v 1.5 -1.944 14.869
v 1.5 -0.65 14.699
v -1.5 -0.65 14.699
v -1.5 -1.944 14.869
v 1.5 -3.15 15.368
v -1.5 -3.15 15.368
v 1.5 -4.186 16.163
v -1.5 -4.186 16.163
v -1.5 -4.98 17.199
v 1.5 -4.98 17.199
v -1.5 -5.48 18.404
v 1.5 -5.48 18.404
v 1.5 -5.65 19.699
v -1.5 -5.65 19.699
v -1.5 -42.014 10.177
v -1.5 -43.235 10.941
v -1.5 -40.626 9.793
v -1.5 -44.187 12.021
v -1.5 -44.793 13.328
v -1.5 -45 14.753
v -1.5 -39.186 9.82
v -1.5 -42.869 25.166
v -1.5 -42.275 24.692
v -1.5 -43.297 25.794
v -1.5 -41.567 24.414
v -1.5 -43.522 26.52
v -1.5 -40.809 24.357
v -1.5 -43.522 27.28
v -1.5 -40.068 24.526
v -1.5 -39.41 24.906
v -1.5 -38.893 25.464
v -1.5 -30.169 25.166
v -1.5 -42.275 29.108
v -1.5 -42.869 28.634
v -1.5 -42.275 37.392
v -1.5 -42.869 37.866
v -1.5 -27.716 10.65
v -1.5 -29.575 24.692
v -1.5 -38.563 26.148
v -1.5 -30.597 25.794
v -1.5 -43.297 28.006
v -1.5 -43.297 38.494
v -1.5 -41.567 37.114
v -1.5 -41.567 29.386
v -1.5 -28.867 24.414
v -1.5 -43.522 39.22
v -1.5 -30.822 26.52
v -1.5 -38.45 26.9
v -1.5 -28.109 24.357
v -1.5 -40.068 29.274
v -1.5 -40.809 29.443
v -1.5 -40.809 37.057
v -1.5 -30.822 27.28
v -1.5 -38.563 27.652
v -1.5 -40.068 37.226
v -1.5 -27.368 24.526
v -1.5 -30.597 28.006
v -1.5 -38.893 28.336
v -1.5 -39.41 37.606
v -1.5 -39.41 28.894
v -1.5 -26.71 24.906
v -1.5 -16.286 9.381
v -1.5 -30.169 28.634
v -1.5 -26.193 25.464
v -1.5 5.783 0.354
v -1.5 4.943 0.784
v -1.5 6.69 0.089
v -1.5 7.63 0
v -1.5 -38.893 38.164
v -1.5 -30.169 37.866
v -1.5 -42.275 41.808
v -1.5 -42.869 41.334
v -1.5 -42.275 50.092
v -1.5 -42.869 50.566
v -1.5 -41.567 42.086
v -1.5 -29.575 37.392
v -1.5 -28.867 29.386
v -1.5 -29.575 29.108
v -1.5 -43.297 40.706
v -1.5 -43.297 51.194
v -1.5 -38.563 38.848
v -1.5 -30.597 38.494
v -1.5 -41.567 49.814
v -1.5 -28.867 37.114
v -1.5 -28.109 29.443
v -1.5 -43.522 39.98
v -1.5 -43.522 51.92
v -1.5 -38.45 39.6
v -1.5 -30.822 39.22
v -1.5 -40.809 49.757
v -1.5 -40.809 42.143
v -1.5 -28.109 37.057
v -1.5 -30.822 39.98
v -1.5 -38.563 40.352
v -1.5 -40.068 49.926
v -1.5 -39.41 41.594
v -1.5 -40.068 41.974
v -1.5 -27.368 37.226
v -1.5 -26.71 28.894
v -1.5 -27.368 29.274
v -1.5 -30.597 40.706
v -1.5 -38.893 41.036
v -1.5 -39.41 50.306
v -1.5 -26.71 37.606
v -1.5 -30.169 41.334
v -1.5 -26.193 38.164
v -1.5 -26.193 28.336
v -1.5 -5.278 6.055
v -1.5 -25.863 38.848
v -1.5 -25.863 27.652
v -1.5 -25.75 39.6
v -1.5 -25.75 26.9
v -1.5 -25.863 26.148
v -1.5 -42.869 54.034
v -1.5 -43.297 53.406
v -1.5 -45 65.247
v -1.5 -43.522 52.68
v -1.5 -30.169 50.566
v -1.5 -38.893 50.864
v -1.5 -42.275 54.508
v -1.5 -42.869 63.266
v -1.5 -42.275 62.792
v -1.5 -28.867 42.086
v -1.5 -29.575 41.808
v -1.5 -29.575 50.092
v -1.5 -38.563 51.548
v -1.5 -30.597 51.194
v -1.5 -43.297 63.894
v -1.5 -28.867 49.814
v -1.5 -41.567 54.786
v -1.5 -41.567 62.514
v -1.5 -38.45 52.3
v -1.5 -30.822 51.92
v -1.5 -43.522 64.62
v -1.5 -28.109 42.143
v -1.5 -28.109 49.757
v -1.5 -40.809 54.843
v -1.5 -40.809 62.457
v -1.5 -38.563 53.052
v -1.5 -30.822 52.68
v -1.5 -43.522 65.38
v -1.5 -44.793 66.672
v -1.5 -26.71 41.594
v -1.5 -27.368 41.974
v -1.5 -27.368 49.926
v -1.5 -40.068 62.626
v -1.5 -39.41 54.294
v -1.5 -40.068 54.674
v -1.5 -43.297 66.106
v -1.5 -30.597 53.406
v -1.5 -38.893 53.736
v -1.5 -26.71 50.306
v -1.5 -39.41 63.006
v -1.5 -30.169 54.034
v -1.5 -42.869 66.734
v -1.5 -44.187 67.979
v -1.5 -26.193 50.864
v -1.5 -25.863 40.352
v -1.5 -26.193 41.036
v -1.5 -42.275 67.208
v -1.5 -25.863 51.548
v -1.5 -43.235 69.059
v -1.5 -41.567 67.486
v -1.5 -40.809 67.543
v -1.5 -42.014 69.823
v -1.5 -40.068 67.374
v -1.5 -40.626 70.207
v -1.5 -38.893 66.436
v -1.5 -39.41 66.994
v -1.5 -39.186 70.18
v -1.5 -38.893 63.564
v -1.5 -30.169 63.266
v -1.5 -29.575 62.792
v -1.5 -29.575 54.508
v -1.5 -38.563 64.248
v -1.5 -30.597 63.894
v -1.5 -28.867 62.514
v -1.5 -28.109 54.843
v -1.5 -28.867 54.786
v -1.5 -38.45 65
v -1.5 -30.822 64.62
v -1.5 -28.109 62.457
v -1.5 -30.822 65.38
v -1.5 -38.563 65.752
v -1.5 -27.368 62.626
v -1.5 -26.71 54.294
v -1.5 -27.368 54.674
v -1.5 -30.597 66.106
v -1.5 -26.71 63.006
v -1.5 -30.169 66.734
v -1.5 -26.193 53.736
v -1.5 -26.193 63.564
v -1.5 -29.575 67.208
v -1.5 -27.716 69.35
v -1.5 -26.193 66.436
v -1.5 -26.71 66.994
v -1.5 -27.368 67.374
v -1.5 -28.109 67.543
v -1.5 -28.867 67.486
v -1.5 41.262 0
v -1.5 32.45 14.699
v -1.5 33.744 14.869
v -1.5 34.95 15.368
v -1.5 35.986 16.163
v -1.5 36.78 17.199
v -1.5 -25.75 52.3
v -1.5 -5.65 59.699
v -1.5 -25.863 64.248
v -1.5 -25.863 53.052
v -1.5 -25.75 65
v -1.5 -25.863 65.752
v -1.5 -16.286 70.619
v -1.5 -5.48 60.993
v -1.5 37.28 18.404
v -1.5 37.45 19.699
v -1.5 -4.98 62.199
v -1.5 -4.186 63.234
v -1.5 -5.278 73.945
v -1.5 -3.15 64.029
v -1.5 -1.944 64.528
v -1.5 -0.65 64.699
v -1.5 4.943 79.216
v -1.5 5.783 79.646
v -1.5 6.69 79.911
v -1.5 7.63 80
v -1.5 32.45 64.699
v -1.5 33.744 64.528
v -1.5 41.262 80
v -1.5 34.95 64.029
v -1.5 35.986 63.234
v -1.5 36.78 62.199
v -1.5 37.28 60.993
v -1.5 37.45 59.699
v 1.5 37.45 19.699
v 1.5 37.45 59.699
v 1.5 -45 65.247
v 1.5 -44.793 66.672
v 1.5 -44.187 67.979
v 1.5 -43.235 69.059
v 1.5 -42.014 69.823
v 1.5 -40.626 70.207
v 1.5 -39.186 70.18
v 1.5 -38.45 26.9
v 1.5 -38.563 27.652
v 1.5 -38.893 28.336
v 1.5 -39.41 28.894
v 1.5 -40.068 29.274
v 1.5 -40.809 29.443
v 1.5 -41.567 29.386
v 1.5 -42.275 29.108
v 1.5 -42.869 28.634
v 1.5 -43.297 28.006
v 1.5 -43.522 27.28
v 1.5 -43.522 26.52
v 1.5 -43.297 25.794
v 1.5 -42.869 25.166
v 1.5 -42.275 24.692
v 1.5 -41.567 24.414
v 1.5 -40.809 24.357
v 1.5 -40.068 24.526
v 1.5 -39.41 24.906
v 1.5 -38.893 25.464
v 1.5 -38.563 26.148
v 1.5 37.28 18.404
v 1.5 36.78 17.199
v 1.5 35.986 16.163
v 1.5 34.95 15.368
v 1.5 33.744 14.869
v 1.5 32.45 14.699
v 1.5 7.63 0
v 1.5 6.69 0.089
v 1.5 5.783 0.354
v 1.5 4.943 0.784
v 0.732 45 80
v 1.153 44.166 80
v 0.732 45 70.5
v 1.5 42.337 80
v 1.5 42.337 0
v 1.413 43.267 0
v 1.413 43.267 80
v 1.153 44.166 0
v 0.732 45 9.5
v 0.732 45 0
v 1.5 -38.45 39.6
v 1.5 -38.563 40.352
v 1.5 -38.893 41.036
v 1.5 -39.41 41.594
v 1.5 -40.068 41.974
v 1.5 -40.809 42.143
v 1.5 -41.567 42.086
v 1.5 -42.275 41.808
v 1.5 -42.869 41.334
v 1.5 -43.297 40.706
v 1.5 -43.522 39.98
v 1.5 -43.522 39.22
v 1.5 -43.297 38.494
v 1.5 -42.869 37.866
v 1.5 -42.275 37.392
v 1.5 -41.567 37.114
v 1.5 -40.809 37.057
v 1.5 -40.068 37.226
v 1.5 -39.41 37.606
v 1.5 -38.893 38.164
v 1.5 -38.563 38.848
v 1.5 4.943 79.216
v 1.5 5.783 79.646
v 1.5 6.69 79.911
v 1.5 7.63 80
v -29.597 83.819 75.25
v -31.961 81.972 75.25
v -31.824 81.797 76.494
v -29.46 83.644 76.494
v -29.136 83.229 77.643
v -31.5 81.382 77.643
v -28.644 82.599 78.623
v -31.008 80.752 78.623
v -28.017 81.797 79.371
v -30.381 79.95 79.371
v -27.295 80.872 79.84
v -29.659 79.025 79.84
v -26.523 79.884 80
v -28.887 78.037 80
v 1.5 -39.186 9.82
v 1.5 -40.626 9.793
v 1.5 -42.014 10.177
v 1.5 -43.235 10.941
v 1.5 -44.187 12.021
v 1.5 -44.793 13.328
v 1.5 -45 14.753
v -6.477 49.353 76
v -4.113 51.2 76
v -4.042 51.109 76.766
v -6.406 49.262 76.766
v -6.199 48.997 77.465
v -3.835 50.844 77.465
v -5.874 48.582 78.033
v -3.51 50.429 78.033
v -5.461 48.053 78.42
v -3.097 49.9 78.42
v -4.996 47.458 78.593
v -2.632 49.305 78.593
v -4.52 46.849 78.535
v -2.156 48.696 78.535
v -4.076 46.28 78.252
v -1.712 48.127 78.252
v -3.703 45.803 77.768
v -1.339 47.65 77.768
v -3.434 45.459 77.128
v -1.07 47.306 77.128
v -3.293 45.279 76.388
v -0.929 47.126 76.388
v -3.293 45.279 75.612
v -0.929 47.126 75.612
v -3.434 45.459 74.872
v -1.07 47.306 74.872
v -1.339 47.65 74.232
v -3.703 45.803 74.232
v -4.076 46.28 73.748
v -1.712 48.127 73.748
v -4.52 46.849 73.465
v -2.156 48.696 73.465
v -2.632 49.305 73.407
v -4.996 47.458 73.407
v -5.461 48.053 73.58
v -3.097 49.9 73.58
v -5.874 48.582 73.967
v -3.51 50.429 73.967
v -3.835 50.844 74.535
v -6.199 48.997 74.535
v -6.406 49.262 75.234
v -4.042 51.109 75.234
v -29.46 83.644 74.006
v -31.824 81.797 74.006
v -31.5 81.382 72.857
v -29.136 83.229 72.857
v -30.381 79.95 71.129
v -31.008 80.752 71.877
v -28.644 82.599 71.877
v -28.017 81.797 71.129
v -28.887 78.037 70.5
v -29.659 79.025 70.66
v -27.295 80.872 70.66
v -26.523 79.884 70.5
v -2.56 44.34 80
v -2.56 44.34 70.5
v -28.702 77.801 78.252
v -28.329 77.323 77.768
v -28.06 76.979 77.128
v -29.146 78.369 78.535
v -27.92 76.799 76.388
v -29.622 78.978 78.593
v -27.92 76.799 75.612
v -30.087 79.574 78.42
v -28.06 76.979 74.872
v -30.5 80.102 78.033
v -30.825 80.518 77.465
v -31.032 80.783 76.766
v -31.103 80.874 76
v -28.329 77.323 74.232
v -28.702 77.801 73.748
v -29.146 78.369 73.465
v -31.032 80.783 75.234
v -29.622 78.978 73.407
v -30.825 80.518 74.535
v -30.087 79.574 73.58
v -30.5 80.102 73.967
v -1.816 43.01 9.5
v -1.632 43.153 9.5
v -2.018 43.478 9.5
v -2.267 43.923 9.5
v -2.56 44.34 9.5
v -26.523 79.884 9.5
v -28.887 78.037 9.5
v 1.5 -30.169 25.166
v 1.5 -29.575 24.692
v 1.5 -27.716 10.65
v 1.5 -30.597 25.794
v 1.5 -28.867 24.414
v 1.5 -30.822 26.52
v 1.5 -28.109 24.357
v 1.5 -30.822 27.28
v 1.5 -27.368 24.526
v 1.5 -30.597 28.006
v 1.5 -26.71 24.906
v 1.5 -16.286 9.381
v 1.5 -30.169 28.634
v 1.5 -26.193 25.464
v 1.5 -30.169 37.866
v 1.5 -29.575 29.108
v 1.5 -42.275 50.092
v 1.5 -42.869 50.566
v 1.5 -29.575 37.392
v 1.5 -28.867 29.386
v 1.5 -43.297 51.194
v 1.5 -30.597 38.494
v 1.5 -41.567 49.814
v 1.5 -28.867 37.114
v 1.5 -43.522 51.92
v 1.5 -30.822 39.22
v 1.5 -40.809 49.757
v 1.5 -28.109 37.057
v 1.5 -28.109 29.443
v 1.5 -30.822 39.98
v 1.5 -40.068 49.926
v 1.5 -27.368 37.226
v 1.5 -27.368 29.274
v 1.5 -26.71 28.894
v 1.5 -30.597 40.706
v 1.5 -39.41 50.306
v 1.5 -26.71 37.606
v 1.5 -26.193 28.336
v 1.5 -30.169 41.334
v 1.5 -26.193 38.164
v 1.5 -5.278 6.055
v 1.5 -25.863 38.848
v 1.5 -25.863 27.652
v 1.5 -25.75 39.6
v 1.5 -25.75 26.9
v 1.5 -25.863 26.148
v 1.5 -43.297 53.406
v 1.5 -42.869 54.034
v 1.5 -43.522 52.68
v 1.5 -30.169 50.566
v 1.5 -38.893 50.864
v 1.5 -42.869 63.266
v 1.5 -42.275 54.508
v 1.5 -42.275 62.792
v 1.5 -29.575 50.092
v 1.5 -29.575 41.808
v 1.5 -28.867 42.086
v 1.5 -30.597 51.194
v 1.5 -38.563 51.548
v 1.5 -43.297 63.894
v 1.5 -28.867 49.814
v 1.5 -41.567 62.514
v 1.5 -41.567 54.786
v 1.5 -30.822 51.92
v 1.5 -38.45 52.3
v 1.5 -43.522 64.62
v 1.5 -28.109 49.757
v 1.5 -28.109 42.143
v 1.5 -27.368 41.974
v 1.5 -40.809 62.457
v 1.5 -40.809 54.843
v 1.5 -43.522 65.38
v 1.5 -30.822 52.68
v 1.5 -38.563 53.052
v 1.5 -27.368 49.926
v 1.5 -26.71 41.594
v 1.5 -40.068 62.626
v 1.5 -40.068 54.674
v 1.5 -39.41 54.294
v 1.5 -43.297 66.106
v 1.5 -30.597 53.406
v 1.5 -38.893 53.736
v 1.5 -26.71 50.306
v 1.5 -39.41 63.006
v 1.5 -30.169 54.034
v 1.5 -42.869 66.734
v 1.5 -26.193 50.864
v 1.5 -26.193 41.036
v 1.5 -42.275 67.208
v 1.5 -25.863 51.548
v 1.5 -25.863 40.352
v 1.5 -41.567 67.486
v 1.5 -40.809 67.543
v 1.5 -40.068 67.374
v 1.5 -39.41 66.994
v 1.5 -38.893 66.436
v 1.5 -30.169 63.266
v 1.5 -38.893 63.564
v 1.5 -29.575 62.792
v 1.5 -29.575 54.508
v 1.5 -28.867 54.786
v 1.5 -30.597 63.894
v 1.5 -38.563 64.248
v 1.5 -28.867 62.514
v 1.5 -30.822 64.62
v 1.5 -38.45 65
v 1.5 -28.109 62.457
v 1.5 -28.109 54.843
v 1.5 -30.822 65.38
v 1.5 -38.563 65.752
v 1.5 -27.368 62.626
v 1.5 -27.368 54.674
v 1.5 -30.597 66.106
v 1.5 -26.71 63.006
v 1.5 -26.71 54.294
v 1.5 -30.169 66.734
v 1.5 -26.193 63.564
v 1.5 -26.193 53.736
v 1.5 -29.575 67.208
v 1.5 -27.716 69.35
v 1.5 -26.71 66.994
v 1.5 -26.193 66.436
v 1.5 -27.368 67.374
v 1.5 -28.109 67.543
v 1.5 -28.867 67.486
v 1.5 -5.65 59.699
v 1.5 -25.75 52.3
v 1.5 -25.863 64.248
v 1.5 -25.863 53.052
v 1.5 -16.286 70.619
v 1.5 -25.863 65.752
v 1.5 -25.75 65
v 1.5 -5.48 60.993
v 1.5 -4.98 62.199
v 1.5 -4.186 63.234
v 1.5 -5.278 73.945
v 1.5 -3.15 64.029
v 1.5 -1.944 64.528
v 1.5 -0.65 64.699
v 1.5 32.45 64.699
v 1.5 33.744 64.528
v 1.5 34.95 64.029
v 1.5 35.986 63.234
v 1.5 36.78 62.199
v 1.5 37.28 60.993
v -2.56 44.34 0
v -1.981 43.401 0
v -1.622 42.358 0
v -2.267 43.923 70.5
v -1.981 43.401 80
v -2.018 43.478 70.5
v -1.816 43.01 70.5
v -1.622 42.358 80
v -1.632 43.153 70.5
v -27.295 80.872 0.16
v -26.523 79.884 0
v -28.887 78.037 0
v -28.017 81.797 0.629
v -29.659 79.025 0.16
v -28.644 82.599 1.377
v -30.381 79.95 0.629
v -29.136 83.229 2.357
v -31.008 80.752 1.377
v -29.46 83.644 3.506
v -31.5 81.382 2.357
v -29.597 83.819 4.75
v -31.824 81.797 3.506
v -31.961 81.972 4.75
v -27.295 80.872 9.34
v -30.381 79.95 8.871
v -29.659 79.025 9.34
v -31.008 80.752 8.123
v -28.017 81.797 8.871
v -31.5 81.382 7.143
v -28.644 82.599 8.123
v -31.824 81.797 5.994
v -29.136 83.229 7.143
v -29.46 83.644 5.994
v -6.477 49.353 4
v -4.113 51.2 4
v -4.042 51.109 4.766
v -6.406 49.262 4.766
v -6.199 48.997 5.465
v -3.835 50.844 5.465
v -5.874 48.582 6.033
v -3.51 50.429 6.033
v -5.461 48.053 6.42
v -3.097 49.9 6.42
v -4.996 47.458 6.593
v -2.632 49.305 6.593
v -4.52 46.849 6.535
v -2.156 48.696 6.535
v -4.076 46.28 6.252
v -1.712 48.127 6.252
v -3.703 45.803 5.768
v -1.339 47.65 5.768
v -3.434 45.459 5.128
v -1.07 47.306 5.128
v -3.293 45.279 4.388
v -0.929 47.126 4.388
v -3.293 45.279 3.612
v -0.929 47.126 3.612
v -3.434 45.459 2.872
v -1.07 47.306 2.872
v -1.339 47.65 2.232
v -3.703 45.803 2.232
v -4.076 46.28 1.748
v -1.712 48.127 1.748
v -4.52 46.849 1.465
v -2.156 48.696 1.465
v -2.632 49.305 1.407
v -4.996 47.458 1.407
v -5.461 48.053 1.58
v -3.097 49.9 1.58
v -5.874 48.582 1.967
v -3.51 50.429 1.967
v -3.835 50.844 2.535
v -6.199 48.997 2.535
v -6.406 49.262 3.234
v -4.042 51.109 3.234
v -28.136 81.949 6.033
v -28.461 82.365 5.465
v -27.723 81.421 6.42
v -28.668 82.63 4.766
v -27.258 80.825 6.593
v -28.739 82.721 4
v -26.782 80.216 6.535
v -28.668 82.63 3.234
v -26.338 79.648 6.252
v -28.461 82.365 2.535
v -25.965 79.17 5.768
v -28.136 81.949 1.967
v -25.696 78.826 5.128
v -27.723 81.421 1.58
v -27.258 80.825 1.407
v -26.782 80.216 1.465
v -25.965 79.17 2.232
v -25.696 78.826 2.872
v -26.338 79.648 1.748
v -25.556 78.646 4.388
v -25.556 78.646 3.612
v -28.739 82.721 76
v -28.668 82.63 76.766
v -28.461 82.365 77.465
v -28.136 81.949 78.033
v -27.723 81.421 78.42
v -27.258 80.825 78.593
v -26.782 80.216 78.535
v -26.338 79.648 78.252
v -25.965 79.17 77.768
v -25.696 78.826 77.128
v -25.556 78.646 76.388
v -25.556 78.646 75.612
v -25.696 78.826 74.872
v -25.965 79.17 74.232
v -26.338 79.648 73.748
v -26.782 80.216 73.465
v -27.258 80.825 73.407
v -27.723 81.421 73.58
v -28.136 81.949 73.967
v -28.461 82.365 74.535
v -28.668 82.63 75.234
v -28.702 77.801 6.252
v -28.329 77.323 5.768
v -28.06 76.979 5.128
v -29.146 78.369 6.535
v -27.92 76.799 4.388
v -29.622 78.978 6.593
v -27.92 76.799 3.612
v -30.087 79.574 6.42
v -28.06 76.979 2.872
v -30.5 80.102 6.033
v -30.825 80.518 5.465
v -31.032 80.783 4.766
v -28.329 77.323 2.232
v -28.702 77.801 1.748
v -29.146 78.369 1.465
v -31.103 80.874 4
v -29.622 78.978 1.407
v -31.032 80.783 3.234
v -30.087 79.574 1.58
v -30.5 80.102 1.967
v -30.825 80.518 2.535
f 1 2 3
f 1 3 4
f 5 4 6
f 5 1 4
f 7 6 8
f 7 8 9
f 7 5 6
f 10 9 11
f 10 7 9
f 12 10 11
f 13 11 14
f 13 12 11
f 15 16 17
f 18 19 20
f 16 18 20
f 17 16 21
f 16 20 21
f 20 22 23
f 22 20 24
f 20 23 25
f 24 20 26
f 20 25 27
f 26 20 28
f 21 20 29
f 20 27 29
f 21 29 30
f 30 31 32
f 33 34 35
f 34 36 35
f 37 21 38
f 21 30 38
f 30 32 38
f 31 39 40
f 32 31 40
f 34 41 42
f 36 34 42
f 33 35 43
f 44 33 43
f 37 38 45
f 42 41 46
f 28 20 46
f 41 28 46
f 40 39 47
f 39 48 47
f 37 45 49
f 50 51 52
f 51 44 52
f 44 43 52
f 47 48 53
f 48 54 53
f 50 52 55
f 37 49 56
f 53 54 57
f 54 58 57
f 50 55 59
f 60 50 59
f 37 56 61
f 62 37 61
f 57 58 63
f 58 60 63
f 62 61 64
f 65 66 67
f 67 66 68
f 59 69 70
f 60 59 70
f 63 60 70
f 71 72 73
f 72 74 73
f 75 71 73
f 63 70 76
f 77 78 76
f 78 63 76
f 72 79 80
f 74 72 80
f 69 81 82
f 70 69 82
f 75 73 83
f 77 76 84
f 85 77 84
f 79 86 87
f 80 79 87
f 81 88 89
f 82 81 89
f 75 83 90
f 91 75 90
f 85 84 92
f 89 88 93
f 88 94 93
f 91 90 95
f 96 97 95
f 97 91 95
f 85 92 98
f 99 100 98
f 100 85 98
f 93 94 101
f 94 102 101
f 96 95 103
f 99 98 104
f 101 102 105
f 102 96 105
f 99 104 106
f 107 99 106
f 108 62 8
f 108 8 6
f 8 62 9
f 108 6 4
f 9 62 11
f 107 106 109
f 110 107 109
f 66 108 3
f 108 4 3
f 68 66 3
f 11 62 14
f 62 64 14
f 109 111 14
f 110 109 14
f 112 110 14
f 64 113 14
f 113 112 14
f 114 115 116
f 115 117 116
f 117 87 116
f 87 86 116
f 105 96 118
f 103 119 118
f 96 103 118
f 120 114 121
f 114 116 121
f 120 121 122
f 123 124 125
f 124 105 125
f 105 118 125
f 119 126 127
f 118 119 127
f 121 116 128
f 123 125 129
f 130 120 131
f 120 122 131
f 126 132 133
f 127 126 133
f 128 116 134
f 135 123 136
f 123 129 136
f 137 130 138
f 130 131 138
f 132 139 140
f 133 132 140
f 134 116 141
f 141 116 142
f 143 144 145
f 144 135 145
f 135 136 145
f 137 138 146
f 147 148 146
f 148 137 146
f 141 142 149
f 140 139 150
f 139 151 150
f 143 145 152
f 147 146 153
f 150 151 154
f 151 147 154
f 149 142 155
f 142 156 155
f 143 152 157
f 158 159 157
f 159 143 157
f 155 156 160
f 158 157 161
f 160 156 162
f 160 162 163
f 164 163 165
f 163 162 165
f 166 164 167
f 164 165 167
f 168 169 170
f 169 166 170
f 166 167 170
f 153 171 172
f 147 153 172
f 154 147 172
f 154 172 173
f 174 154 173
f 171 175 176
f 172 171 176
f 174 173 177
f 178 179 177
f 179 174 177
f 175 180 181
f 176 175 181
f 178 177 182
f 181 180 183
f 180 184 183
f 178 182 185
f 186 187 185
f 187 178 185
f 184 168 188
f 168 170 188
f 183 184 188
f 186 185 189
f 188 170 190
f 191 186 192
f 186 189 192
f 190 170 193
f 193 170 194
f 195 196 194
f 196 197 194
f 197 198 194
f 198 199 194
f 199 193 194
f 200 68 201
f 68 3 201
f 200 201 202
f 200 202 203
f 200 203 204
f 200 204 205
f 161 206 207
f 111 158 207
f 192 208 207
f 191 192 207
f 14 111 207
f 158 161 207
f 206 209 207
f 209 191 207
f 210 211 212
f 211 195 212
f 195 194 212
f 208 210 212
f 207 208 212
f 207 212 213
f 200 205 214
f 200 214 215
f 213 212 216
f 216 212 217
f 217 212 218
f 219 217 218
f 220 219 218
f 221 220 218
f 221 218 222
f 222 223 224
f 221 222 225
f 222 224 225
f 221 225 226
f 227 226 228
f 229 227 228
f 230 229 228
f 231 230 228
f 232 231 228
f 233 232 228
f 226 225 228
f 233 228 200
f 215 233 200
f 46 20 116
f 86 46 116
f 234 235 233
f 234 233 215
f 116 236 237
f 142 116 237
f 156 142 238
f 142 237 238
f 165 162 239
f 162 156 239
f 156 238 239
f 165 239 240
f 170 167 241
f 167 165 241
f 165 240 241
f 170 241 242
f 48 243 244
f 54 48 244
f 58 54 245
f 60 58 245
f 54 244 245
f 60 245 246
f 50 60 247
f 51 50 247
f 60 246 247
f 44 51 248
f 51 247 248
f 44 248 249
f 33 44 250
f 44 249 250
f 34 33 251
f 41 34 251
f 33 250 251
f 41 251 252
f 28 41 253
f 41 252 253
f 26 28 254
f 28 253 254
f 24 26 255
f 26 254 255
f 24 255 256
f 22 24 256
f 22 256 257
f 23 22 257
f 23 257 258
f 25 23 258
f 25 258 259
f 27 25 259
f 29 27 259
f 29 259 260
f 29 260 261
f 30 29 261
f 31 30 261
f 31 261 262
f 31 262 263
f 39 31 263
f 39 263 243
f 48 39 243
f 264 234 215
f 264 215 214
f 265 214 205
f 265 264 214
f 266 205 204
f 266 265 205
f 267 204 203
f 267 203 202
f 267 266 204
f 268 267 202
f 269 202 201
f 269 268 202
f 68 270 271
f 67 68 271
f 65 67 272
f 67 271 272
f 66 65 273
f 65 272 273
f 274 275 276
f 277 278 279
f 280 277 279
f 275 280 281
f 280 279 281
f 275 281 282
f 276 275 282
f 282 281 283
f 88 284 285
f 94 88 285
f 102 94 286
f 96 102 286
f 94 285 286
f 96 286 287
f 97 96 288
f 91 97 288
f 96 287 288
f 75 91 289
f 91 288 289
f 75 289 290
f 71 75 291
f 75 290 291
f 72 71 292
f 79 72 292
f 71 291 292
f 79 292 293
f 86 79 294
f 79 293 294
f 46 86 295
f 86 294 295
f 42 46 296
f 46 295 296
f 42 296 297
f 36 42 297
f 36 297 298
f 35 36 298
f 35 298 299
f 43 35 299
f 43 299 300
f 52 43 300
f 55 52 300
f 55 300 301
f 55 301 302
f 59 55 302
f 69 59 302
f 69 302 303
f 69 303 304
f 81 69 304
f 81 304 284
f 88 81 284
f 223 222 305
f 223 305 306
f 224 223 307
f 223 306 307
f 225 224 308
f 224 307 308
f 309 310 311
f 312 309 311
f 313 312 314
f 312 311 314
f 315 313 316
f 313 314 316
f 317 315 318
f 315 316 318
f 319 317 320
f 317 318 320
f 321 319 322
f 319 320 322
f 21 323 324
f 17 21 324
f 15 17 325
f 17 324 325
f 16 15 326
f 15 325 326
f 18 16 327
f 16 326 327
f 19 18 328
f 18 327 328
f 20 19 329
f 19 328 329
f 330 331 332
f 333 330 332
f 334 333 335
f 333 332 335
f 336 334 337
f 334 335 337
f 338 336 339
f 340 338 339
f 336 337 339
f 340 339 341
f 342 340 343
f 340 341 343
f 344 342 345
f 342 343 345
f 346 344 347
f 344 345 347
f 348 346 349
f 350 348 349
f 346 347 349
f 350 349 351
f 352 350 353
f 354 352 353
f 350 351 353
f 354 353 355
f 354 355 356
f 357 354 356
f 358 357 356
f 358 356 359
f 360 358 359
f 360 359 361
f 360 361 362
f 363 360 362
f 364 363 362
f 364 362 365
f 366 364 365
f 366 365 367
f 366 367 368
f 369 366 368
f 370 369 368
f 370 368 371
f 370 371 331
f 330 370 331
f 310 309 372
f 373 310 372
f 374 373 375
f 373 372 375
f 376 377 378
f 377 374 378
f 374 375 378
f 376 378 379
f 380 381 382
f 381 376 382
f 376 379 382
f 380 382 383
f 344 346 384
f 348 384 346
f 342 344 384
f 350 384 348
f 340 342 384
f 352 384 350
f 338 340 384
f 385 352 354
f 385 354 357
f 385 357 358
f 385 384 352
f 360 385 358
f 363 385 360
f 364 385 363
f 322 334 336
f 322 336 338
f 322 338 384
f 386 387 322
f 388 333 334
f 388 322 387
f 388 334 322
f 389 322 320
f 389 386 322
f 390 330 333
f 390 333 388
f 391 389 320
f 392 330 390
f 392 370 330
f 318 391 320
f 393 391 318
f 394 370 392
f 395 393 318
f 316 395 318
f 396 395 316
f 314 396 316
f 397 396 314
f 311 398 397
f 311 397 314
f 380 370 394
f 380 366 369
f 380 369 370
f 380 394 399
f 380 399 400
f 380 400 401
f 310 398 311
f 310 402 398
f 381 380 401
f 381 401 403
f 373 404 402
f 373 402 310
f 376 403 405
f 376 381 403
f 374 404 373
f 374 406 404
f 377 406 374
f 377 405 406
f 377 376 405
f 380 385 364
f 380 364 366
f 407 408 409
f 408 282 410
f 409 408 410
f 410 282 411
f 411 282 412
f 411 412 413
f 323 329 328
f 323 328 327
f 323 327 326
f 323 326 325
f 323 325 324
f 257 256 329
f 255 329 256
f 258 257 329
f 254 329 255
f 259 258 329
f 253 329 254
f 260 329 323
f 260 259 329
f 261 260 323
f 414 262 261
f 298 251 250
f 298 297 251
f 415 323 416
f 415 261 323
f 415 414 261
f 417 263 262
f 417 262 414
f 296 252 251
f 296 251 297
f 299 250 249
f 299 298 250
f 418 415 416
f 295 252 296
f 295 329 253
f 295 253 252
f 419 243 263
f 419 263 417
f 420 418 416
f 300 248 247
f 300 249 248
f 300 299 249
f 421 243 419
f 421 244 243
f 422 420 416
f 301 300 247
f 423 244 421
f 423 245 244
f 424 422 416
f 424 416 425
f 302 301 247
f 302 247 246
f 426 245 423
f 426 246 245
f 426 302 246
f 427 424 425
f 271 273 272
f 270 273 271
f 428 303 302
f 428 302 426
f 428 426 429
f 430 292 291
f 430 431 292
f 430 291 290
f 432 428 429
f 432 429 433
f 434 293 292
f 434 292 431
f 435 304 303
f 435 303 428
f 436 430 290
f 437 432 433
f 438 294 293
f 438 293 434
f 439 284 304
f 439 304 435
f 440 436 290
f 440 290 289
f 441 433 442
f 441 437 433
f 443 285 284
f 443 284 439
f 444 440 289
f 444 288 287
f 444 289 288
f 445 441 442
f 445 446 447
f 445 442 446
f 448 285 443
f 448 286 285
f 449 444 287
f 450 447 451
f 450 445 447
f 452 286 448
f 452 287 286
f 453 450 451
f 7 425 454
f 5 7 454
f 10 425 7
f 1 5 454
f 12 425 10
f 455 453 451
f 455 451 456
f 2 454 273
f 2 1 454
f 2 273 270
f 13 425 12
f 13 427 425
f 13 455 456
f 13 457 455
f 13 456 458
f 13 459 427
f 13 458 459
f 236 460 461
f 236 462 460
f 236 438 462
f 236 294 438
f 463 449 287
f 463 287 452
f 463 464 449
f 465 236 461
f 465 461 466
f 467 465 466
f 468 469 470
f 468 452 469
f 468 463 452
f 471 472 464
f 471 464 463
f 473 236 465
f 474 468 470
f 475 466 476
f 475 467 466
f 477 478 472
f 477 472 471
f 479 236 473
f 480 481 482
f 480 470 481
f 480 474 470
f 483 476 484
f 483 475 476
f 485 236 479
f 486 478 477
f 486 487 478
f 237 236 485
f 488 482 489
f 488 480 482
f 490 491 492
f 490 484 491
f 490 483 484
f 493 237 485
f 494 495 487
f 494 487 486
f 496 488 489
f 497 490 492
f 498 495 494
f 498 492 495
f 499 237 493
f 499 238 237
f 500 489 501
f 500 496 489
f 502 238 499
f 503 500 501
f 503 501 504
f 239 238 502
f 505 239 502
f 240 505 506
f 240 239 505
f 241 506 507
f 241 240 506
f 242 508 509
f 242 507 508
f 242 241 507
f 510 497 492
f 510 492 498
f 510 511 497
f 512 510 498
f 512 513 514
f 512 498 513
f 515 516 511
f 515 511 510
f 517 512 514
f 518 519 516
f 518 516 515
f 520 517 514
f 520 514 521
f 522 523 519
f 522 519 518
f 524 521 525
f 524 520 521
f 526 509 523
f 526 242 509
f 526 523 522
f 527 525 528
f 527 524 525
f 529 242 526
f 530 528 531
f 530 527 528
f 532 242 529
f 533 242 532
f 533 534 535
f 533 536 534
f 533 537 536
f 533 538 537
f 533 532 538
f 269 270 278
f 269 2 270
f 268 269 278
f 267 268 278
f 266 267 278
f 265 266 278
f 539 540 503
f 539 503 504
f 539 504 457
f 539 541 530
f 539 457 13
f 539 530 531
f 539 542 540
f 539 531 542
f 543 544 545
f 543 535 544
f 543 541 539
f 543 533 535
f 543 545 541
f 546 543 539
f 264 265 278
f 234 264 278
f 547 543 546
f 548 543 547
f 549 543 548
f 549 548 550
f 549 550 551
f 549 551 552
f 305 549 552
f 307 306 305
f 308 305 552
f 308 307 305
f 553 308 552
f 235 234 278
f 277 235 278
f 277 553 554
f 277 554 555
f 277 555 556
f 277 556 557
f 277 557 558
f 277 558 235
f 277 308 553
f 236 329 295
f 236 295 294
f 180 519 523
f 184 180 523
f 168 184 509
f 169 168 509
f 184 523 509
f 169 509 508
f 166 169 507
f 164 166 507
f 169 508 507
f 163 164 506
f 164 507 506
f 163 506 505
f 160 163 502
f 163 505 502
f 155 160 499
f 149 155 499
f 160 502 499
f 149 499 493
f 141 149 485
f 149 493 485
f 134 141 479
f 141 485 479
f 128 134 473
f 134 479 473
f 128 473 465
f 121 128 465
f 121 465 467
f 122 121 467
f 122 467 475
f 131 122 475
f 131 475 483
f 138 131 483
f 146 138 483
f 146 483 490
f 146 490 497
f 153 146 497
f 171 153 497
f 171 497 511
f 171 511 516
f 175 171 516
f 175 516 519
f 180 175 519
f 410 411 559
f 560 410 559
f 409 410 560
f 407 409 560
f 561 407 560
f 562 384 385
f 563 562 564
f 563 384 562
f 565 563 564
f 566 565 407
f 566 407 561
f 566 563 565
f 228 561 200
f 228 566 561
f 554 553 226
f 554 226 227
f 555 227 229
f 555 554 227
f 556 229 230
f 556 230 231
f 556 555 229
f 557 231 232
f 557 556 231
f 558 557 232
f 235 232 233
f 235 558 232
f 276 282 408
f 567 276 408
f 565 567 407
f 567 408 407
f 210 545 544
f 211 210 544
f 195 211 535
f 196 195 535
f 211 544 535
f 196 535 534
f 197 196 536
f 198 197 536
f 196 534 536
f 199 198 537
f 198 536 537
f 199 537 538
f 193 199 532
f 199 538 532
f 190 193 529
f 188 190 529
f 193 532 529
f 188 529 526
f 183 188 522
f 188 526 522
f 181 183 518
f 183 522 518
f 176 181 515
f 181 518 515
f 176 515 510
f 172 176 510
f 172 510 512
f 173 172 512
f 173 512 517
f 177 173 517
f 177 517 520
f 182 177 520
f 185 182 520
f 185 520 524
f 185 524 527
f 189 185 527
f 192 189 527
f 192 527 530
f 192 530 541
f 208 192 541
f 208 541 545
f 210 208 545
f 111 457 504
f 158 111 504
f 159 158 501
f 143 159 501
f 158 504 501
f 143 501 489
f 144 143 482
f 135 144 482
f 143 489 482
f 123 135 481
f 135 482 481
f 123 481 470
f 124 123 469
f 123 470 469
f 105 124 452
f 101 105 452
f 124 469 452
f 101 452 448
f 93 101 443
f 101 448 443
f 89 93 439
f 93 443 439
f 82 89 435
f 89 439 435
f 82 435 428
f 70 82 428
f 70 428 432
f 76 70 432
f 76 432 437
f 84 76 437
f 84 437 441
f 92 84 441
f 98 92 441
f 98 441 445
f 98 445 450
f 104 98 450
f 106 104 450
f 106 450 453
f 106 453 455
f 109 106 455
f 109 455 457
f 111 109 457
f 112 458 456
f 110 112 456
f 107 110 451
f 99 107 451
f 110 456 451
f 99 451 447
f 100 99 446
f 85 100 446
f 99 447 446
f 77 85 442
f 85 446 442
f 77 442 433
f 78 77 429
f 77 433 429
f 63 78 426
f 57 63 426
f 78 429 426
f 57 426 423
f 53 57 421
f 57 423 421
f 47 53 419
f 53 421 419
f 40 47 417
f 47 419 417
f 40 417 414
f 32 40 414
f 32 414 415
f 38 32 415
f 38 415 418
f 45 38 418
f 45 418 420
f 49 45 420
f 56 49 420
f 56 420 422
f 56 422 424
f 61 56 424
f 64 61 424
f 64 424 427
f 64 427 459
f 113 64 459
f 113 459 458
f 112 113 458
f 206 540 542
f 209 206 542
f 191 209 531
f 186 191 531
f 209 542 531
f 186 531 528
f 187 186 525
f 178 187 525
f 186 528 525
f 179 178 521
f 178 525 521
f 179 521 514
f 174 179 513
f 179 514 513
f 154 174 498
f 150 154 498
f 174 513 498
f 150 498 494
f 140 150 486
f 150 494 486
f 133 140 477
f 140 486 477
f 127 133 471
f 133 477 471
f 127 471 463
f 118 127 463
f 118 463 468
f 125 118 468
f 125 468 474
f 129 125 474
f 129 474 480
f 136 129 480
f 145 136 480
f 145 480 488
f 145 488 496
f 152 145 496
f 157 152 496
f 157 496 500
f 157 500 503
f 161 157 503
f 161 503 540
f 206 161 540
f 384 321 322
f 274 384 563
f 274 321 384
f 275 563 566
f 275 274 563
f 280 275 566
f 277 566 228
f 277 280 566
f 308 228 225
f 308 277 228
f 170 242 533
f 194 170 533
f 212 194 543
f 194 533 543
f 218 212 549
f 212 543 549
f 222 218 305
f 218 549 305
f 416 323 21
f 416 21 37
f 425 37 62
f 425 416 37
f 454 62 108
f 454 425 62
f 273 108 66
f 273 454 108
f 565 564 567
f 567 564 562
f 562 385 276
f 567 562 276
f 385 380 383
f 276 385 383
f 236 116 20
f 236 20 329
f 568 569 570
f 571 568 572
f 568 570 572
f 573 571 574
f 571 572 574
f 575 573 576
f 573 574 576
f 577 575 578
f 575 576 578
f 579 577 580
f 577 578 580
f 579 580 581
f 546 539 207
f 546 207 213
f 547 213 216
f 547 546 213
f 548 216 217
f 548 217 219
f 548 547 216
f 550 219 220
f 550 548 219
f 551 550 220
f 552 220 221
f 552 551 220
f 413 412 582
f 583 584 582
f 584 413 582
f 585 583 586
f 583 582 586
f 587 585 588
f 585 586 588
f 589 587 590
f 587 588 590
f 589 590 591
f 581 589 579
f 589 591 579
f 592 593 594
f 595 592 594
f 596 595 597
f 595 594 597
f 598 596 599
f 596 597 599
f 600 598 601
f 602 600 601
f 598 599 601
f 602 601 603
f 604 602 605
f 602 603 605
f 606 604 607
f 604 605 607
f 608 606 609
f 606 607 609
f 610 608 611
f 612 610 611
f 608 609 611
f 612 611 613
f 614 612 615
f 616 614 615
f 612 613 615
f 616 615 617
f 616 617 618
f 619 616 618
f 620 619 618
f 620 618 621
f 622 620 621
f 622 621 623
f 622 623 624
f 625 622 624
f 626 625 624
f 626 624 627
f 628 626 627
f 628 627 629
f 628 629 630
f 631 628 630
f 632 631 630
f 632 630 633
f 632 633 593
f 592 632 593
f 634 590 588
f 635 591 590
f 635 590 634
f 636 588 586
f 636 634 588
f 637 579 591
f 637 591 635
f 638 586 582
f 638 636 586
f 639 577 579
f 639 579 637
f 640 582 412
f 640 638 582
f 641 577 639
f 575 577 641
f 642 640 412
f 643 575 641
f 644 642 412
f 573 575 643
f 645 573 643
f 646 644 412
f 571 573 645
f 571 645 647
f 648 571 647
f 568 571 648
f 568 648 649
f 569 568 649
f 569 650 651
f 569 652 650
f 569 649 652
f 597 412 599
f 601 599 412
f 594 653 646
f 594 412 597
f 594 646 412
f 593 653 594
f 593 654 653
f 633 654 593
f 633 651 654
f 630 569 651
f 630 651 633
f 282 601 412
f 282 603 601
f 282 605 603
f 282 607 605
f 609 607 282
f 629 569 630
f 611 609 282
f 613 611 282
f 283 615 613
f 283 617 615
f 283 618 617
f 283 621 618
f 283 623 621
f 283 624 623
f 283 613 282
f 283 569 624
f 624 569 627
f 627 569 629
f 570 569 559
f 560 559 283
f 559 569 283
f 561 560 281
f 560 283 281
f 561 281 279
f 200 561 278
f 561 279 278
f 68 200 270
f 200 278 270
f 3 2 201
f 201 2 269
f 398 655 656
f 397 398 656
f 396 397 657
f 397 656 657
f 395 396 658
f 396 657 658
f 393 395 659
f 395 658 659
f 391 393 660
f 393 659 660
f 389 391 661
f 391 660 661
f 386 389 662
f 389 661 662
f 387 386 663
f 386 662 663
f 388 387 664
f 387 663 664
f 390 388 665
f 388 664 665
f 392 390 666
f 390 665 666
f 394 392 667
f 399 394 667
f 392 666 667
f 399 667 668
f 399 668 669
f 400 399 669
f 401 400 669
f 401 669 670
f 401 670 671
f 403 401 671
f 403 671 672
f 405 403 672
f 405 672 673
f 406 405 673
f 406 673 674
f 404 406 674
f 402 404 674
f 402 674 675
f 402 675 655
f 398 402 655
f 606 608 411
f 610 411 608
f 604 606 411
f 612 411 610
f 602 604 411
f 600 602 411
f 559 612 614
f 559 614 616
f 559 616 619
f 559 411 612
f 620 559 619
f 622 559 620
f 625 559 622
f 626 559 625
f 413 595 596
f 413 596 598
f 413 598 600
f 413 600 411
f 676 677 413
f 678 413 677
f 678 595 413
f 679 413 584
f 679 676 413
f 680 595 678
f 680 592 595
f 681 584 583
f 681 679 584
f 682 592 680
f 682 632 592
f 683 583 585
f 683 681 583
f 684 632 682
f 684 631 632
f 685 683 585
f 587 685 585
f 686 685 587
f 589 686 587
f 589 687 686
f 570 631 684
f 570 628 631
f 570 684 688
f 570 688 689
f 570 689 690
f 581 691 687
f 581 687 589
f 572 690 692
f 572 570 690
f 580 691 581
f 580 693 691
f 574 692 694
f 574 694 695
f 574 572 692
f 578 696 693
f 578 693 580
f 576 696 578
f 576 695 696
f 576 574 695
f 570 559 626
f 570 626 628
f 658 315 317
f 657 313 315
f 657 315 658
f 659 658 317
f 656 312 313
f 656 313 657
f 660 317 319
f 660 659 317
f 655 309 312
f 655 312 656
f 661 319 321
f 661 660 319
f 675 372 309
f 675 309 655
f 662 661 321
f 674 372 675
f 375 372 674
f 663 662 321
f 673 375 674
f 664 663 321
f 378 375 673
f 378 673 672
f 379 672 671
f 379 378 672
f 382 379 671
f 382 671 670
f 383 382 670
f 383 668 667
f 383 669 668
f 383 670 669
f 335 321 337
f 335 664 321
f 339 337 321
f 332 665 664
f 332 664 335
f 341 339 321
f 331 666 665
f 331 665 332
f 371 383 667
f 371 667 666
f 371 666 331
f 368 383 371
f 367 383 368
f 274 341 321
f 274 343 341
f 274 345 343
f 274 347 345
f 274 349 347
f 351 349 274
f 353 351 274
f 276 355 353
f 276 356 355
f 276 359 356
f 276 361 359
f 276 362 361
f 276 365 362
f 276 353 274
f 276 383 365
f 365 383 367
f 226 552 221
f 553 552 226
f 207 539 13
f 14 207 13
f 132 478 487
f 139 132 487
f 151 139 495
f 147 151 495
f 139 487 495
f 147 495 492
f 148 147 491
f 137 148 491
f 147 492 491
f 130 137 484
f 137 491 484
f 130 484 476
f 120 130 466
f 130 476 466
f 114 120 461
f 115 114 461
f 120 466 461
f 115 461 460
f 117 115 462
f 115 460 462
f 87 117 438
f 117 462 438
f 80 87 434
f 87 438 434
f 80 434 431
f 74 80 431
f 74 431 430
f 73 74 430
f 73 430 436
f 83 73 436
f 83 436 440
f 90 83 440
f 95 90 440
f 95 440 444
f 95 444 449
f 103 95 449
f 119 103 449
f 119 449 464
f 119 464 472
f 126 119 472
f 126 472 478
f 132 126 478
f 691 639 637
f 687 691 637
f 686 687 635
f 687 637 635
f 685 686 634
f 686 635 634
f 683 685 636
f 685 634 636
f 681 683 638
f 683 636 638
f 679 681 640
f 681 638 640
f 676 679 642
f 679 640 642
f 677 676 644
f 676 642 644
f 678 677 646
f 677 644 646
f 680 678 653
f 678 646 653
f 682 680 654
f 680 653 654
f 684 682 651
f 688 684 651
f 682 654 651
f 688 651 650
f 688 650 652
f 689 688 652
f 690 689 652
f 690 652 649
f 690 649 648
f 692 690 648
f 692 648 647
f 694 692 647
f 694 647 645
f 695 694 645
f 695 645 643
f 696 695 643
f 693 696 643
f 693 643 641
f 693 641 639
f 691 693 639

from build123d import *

# Parameters (mm, degrees)
SKETCH_1_W          = 3
SKETCH_1_H          = 90
EXTRUDE_1_DEPTH     = 80
SKETCH_2_R          = 2.6
CUT_EXTRUDE_1_DEPTH = 118.276484819
SKETCH_3_W          = 49.268401117
SKETCH_3_H          = 61
CUT_EXTRUDE_2_DEPTH = 118.276484819
SKETCH_4_R          = 2.55
CUT_EXTRUDE_3_DEPTH = 121.608375453
CUT_EXTRUDE_4_DEPTH = 121.608375453
FILLET_2_R          = 5
SKETCH_6_W          = 50
SKETCH_6_H          = 43.1
CUT_EXTRUDE_6_DEPTH = 121.608375453
FILLET_3_R          = 5


with BuildPart() as part:
    # 草图1 → 凸台-拉伸1 (new body)
    with BuildSketch(Plane.XY):
        Polygon((-1.18201613, 42.576507787), (-31.965089897, 81.977045467), (-29.601057636, 83.824029893), (1.18201613, 44.423492213), align=None)
        Rectangle(SKETCH_1_W, SKETCH_1_H)
    extrude(amount=EXTRUDE_1_DEPTH)

    # 草图2 → 切除-拉伸1 (cut, through all)
    with BuildSketch(Plane(origin=(22.285948177, 17.411690984, 0), x_dir=(0.6156614753256597, -0.788010753606721, 0), z_dir=(0.788010753606721, 0.6156614753256597, 0))):
        with Locations(Location((-80.278467782, -4, 0), (0, 0, 180))):
            Circle(SKETCH_2_R)
        with Locations(Location((-80.278467782, -76, 0), (0, 0, 180))):
            Circle(SKETCH_2_R)
        with Locations(Location((-40.278467782, -4, 0), (0, 0, 180))):
            Circle(SKETCH_2_R)
        with Locations(Location((-40.278467782, -76, 0), (0, 0, 180))):
            Circle(SKETCH_2_R)
    extrude(amount=-CUT_EXTRUDE_1_DEPTH, mode=Mode.SUBTRACT)

    # 草图3 → 切除-拉伸2 (cut, through all)
    with BuildSketch(Plane(origin=(22.285948177, 17.411690984, 0), x_dir=(0.6156614753256597, -0.788010753606721, 0), z_dir=(0.788010753606721, 0.6156614753256597, 0))):
        with Locations((-59.644267224, -40)):
            Rectangle(SKETCH_3_W, SKETCH_3_H)
    extrude(amount=-CUT_EXTRUDE_2_DEPTH, mode=Mode.SUBTRACT)

    # 草图4 → 切除-拉伸3 (cut, through all)
    with BuildSketch(Plane(origin=(1.5, 0, 0), x_dir=(0, 0, -1), z_dir=(1, 0, 0))):
        with Locations(Location((-65, -28.3, 0), (0, 0, 90))):
            Circle(SKETCH_4_R)
        with Locations(Location((-65, -41, 0), (0, 0, 90))):
            Circle(SKETCH_4_R)
        with Locations(Location((-52.3, -28.3, 0), (0, 0, 90))):
            Circle(SKETCH_4_R)
        with Locations(Location((-52.3, -41, 0), (0, 0, 90))):
            Circle(SKETCH_4_R)
        with Locations(Location((-39.6, -28.3, 0), (0, 0, 90))):
            Circle(SKETCH_4_R)
        with Locations(Location((-39.6, -41, 0), (0, 0, 90))):
            Circle(SKETCH_4_R)
        with Locations(Location((-26.9, -28.3, 0), (0, 0, 90))):
            Circle(SKETCH_4_R)
        with Locations(Location((-26.9, -41, 0), (0, 0, 90))):
            Circle(SKETCH_4_R)
    extrude(amount=-CUT_EXTRUDE_3_DEPTH, mode=Mode.SUBTRACT)

    # 草图5 → 切除-拉伸4 (cut, through all)
    with BuildSketch(Plane(origin=(1.5, 0, 0), x_dir=(0, 0, -1), z_dir=(1, 0, 0))):
        with BuildLine():
            Line((-80, 6.141923624), (-80, -45))
            Line((-80, -45), (-71.424177932, -45))
            ThreePointArc((-71.424177932, -45), (-70.206204317, -18.505774381), (-80, 6.141923624))
        make_face()
        with BuildLine():
            Line((0, -45), (-8.575822068, -45))
            ThreePointArc((-8.575822068, -45), (-9.793795683, -18.505774381), (0, 6.141923624))
            Line((0, 6.141923624), (0, -45))
        make_face()
    extrude(amount=-CUT_EXTRUDE_4_DEPTH, mode=Mode.SUBTRACT)

    # 圆角2
    # the kernel refuses this fillet: 5 mm, written as the material it adds along each edge
    with BuildSketch(Plane(origin=(-1.5, 42.98350858, 80), x_dir=(-0.61566147532566, 0.7880107536067206, 0), z_dir=(0, 0, -1))) as fillet_2_piece_1_section:
        with BuildLine():
            CenterArc((FILLET_2_R * 0.34432761329, -FILLET_2_R), FILLET_2_R, 90, 38)
            Line((-FILLET_2_R * 0.271333862036, -FILLET_2_R * 0.211989246393), (0, 0))
            Line((0, 0), (FILLET_2_R * 0.34432761329, 0))
        make_face()
    fillet_2_piece_1 = extrude(amount=84.304095166, mode=Mode.PRIVATE)
    fillet_2_piece_1 = split(fillet_2_piece_1, bisect_by=Plane(origin=(-1.5, 42.98350858, 70.5), z_dir=(0, 0, 1)), keep=Keep.TOP, mode=Mode.PRIVATE)
    add(fillet_2_piece_1)
    with BuildSketch(Plane(origin=(-1.5, 42.98350858, 84.304095166), x_dir=(-0.61566147532566, 0.7880107536067206, 0), z_dir=(0, 0, -1))) as fillet_2_piece_2_section:
        with BuildLine():
            CenterArc((FILLET_2_R * 0.34432761329, -FILLET_2_R), FILLET_2_R, 90, 38)
            Line((-FILLET_2_R * 0.271333862036, -FILLET_2_R * 0.211989246393), (0, 0))
            Line((0, 0), (FILLET_2_R * 0.34432761329, 0))
        make_face()
    fillet_2_piece_2 = extrude(amount=84.304095166, mode=Mode.PRIVATE)
    fillet_2_piece_2 = split(fillet_2_piece_2, bisect_by=Plane(origin=(-1.632433378, 43.153015574, 84.304095166), z_dir=(0.6156614753256597, -0.7880107536067209, 0)), keep=Keep.TOP, mode=Mode.PRIVATE)
    fillet_2_piece_2 = split(fillet_2_piece_2, bisect_by=Plane(origin=(-1.5, 42.98350858, 70.5), z_dir=(0, 0, -1)), keep=Keep.TOP, mode=Mode.PRIVATE)
    add(fillet_2_piece_2)
    with BuildSketch(Plane(origin=(-1.5, 42.98350858, 84.304095166), x_dir=(-0.61566147532566, 0.7880107536067206, 0), z_dir=(0, 0, -1))) as fillet_2_piece_3_section:
        with BuildLine():
            CenterArc((FILLET_2_R * 0.34432761329, -FILLET_2_R), FILLET_2_R, 90, 38)
            Line((-FILLET_2_R * 0.271333862036, -FILLET_2_R * 0.211989246393), (0, 0))
            Line((0, 0), (FILLET_2_R * 0.34432761329, 0))
        make_face()
    fillet_2_piece_3 = extrude(amount=84.304095166, mode=Mode.PRIVATE)
    fillet_2_piece_3 = split(fillet_2_piece_3, bisect_by=Plane(origin=(-1.5, 42.98350858, 9.5), z_dir=(0, 0, -1)), keep=Keep.TOP, mode=Mode.PRIVATE)
    add(fillet_2_piece_3)
    # the kernel refuses this fillet: 5 mm, written as the material it takes off along each edge
    with BuildSketch(Plane(origin=(1.5, 45, -6.658439614), x_dir=(0, -1, 0), z_dir=(0, 0, 1))) as fillet_2_2_piece_1:
        with BuildLine():
            CenterArc((2.663375846, -5), FILLET_2_R, 90, 32.186384057)
            Line((0, -0.768401117), (0, 0))
            Line((0, 0), (2.663375846, 0))
        make_face()
    extrude(amount=93.316879228, mode=Mode.SUBTRACT)

    # 草图6 → 切除-拉伸6 (cut, through all)
    with BuildSketch(Plane(origin=(1.5, 0, 0), x_dir=(0, 0, -1), z_dir=(1, 0, 0))):
        with Locations((-39.698542008, 15.9)):
            Rectangle(SKETCH_6_W, SKETCH_6_H)
    extrude(amount=-CUT_EXTRUDE_6_DEPTH, mode=Mode.SUBTRACT)

    # 圆角3
    # the kernel refuses this fillet: 5 mm, written as the material it adds along each edge
    with BuildSketch(Plane(origin=(1.5, -5.65, 14.698542008), x_dir=(0, 1, 0), z_dir=(-1, 0, 0)), Plane(origin=(1.5, -5.65, 64.698542008), x_dir=(0, 0, -1), z_dir=(-1, 0, 0)), Plane(origin=(1.5, 37.45, 64.698542008), x_dir=(0, -1, 0), z_dir=(-1, 0, 0))) as fillet_3_piece_1:
        with BuildLine():
            CenterArc((FILLET_3_R, -FILLET_3_R), FILLET_3_R, 90, 90)
            Line((0, -FILLET_3_R), (0, 0))
            Line((0, 0), (FILLET_3_R, 0))
        make_face()
    extrude(amount=3)
    with BuildSketch(Plane(origin=(1.5, 37.45, 14.698542008), x_dir=(0, -1, 0), z_dir=(-1, 0, 0))) as fillet_3_piece_2:
        with BuildLine():
            CenterArc((FILLET_3_R, FILLET_3_R), FILLET_3_R, 180, 90)
            Line((0, FILLET_3_R), (0, 0))
            Line((0, 0), (FILLET_3_R, 0))
        make_face()
    extrude(amount=3)
    # the kernel refuses this fillet: 5 mm, written as the material it takes off along each edge
    with BuildSketch(Plane(origin=(-41.815224317, 74.281277026, 0), x_dir=(0.6156614753256596, -0.7880107536067208, 0), z_dir=(0.7880107536067208, 0.6156614753256597, 0)), Plane(origin=(-19.750923216, 91.519798335, 9.5), x_dir=(0.6156614753256597, -0.7880107536067208, 1.0658141036401496e-15), z_dir=(-0.7880107536067209, -0.6156614753256597, 0))) as fillet_3_2_piece_1:
        with BuildLine():
            CenterArc((FILLET_3_R, -FILLET_3_R), FILLET_3_R, 90, 90)
            Line((0, -FILLET_3_R), (0, 0))
            Line((0, 0), (FILLET_3_R, 0))
        make_face()
    extrude(amount=28, mode=Mode.SUBTRACT)
    with BuildSketch(Plane(origin=(-41.815224317, 74.281277026, 80), x_dir=(0.6156614753256597, -0.7880107536067208, 0), z_dir=(0.7880107536067208, 0.6156614753256597, 0)), Plane(origin=(-19.750923216, 91.519798335, 70.5), x_dir=(0.6156614753256597, -0.7880107536067208, 0), z_dir=(-0.7880107536067209, -0.6156614753256597, 0))) as fillet_3_2_piece_2:
        with BuildLine():
            CenterArc((FILLET_3_R, FILLET_3_R), FILLET_3_R, 180, 90)
            Line((0, FILLET_3_R), (0, 0))
            Line((0, 0), (FILLET_3_R, 0))
        make_face()
    extrude(amount=28, mode=Mode.SUBTRACT)
    with BuildSketch(Plane(origin=(5.221396316, 6.141923624, 0), x_dir=(0, 1, 0), z_dir=(-1, 0, 0))) as fillet_3_2_piece_3:
        with BuildLine():
            CenterArc((1.488558526, -5), FILLET_3_R, 90, 32.518664638)
            ThreePointArc((-1.199313086, -0.783918147), (-0.597427923, -0.395368629), (0, 0))
            Line((0, 0), (1.488558526, 0))
        make_face()
    extrude(amount=10.442792632, mode=Mode.SUBTRACT)
    with BuildSketch(Plane(origin=(5.221396316, 6.141923624, 80), x_dir=(0, 1, 0), z_dir=(-1, 0, 0))) as fillet_3_2_piece_4:
        with BuildLine():
            CenterArc((1.488558526, 5), FILLET_3_R, 237.481335362, 32.518664638)
            ThreePointArc((-1.199313086, 0.783918147), (-0.597427923, 0.395368629), (0, 0))
            Line((0, 0), (1.488558526, 0))
        make_face()
    extrude(amount=10.442792632, mode=Mode.SUBTRACT)
    with BuildSketch(Plane(origin=(16.943632487, -45, 71.424177932), x_dir=(0, 0, -1), z_dir=(-1, 0, 0))) as fillet_3_2_piece_5:
        with BuildLine():
            CenterArc((6.177452995, -5), FILLET_3_R, 90, 99.373749783)
            ThreePointArc((1.244218563, -5.814369722), (0.69074329, -2.892497851), (0, 0))
            Line((0, 0), (6.177452995, 0))
        make_face()
    extrude(amount=33.887264974, mode=Mode.SUBTRACT)
    with BuildSketch(Plane(origin=(16.943632487, -45, 8.575822068), x_dir=(0, 0.9778615645016191, 0.20925286299223153), z_dir=(-1, 0, 0))) as fillet_3_2_piece_6:
        with BuildLine():
            CenterArc((6.181957548, -4.994429535), FILLET_3_R, 92.704821928, 99.373749783)
            Line((1.292649725, -6.04069385), (0, 0))
            ThreePointArc((0, 0), (2.973002485, -0.070187858), (5.946004969, 0))
        make_face()
    extrude(amount=33.887264974, mode=Mode.SUBTRACT)


solid = part.part
